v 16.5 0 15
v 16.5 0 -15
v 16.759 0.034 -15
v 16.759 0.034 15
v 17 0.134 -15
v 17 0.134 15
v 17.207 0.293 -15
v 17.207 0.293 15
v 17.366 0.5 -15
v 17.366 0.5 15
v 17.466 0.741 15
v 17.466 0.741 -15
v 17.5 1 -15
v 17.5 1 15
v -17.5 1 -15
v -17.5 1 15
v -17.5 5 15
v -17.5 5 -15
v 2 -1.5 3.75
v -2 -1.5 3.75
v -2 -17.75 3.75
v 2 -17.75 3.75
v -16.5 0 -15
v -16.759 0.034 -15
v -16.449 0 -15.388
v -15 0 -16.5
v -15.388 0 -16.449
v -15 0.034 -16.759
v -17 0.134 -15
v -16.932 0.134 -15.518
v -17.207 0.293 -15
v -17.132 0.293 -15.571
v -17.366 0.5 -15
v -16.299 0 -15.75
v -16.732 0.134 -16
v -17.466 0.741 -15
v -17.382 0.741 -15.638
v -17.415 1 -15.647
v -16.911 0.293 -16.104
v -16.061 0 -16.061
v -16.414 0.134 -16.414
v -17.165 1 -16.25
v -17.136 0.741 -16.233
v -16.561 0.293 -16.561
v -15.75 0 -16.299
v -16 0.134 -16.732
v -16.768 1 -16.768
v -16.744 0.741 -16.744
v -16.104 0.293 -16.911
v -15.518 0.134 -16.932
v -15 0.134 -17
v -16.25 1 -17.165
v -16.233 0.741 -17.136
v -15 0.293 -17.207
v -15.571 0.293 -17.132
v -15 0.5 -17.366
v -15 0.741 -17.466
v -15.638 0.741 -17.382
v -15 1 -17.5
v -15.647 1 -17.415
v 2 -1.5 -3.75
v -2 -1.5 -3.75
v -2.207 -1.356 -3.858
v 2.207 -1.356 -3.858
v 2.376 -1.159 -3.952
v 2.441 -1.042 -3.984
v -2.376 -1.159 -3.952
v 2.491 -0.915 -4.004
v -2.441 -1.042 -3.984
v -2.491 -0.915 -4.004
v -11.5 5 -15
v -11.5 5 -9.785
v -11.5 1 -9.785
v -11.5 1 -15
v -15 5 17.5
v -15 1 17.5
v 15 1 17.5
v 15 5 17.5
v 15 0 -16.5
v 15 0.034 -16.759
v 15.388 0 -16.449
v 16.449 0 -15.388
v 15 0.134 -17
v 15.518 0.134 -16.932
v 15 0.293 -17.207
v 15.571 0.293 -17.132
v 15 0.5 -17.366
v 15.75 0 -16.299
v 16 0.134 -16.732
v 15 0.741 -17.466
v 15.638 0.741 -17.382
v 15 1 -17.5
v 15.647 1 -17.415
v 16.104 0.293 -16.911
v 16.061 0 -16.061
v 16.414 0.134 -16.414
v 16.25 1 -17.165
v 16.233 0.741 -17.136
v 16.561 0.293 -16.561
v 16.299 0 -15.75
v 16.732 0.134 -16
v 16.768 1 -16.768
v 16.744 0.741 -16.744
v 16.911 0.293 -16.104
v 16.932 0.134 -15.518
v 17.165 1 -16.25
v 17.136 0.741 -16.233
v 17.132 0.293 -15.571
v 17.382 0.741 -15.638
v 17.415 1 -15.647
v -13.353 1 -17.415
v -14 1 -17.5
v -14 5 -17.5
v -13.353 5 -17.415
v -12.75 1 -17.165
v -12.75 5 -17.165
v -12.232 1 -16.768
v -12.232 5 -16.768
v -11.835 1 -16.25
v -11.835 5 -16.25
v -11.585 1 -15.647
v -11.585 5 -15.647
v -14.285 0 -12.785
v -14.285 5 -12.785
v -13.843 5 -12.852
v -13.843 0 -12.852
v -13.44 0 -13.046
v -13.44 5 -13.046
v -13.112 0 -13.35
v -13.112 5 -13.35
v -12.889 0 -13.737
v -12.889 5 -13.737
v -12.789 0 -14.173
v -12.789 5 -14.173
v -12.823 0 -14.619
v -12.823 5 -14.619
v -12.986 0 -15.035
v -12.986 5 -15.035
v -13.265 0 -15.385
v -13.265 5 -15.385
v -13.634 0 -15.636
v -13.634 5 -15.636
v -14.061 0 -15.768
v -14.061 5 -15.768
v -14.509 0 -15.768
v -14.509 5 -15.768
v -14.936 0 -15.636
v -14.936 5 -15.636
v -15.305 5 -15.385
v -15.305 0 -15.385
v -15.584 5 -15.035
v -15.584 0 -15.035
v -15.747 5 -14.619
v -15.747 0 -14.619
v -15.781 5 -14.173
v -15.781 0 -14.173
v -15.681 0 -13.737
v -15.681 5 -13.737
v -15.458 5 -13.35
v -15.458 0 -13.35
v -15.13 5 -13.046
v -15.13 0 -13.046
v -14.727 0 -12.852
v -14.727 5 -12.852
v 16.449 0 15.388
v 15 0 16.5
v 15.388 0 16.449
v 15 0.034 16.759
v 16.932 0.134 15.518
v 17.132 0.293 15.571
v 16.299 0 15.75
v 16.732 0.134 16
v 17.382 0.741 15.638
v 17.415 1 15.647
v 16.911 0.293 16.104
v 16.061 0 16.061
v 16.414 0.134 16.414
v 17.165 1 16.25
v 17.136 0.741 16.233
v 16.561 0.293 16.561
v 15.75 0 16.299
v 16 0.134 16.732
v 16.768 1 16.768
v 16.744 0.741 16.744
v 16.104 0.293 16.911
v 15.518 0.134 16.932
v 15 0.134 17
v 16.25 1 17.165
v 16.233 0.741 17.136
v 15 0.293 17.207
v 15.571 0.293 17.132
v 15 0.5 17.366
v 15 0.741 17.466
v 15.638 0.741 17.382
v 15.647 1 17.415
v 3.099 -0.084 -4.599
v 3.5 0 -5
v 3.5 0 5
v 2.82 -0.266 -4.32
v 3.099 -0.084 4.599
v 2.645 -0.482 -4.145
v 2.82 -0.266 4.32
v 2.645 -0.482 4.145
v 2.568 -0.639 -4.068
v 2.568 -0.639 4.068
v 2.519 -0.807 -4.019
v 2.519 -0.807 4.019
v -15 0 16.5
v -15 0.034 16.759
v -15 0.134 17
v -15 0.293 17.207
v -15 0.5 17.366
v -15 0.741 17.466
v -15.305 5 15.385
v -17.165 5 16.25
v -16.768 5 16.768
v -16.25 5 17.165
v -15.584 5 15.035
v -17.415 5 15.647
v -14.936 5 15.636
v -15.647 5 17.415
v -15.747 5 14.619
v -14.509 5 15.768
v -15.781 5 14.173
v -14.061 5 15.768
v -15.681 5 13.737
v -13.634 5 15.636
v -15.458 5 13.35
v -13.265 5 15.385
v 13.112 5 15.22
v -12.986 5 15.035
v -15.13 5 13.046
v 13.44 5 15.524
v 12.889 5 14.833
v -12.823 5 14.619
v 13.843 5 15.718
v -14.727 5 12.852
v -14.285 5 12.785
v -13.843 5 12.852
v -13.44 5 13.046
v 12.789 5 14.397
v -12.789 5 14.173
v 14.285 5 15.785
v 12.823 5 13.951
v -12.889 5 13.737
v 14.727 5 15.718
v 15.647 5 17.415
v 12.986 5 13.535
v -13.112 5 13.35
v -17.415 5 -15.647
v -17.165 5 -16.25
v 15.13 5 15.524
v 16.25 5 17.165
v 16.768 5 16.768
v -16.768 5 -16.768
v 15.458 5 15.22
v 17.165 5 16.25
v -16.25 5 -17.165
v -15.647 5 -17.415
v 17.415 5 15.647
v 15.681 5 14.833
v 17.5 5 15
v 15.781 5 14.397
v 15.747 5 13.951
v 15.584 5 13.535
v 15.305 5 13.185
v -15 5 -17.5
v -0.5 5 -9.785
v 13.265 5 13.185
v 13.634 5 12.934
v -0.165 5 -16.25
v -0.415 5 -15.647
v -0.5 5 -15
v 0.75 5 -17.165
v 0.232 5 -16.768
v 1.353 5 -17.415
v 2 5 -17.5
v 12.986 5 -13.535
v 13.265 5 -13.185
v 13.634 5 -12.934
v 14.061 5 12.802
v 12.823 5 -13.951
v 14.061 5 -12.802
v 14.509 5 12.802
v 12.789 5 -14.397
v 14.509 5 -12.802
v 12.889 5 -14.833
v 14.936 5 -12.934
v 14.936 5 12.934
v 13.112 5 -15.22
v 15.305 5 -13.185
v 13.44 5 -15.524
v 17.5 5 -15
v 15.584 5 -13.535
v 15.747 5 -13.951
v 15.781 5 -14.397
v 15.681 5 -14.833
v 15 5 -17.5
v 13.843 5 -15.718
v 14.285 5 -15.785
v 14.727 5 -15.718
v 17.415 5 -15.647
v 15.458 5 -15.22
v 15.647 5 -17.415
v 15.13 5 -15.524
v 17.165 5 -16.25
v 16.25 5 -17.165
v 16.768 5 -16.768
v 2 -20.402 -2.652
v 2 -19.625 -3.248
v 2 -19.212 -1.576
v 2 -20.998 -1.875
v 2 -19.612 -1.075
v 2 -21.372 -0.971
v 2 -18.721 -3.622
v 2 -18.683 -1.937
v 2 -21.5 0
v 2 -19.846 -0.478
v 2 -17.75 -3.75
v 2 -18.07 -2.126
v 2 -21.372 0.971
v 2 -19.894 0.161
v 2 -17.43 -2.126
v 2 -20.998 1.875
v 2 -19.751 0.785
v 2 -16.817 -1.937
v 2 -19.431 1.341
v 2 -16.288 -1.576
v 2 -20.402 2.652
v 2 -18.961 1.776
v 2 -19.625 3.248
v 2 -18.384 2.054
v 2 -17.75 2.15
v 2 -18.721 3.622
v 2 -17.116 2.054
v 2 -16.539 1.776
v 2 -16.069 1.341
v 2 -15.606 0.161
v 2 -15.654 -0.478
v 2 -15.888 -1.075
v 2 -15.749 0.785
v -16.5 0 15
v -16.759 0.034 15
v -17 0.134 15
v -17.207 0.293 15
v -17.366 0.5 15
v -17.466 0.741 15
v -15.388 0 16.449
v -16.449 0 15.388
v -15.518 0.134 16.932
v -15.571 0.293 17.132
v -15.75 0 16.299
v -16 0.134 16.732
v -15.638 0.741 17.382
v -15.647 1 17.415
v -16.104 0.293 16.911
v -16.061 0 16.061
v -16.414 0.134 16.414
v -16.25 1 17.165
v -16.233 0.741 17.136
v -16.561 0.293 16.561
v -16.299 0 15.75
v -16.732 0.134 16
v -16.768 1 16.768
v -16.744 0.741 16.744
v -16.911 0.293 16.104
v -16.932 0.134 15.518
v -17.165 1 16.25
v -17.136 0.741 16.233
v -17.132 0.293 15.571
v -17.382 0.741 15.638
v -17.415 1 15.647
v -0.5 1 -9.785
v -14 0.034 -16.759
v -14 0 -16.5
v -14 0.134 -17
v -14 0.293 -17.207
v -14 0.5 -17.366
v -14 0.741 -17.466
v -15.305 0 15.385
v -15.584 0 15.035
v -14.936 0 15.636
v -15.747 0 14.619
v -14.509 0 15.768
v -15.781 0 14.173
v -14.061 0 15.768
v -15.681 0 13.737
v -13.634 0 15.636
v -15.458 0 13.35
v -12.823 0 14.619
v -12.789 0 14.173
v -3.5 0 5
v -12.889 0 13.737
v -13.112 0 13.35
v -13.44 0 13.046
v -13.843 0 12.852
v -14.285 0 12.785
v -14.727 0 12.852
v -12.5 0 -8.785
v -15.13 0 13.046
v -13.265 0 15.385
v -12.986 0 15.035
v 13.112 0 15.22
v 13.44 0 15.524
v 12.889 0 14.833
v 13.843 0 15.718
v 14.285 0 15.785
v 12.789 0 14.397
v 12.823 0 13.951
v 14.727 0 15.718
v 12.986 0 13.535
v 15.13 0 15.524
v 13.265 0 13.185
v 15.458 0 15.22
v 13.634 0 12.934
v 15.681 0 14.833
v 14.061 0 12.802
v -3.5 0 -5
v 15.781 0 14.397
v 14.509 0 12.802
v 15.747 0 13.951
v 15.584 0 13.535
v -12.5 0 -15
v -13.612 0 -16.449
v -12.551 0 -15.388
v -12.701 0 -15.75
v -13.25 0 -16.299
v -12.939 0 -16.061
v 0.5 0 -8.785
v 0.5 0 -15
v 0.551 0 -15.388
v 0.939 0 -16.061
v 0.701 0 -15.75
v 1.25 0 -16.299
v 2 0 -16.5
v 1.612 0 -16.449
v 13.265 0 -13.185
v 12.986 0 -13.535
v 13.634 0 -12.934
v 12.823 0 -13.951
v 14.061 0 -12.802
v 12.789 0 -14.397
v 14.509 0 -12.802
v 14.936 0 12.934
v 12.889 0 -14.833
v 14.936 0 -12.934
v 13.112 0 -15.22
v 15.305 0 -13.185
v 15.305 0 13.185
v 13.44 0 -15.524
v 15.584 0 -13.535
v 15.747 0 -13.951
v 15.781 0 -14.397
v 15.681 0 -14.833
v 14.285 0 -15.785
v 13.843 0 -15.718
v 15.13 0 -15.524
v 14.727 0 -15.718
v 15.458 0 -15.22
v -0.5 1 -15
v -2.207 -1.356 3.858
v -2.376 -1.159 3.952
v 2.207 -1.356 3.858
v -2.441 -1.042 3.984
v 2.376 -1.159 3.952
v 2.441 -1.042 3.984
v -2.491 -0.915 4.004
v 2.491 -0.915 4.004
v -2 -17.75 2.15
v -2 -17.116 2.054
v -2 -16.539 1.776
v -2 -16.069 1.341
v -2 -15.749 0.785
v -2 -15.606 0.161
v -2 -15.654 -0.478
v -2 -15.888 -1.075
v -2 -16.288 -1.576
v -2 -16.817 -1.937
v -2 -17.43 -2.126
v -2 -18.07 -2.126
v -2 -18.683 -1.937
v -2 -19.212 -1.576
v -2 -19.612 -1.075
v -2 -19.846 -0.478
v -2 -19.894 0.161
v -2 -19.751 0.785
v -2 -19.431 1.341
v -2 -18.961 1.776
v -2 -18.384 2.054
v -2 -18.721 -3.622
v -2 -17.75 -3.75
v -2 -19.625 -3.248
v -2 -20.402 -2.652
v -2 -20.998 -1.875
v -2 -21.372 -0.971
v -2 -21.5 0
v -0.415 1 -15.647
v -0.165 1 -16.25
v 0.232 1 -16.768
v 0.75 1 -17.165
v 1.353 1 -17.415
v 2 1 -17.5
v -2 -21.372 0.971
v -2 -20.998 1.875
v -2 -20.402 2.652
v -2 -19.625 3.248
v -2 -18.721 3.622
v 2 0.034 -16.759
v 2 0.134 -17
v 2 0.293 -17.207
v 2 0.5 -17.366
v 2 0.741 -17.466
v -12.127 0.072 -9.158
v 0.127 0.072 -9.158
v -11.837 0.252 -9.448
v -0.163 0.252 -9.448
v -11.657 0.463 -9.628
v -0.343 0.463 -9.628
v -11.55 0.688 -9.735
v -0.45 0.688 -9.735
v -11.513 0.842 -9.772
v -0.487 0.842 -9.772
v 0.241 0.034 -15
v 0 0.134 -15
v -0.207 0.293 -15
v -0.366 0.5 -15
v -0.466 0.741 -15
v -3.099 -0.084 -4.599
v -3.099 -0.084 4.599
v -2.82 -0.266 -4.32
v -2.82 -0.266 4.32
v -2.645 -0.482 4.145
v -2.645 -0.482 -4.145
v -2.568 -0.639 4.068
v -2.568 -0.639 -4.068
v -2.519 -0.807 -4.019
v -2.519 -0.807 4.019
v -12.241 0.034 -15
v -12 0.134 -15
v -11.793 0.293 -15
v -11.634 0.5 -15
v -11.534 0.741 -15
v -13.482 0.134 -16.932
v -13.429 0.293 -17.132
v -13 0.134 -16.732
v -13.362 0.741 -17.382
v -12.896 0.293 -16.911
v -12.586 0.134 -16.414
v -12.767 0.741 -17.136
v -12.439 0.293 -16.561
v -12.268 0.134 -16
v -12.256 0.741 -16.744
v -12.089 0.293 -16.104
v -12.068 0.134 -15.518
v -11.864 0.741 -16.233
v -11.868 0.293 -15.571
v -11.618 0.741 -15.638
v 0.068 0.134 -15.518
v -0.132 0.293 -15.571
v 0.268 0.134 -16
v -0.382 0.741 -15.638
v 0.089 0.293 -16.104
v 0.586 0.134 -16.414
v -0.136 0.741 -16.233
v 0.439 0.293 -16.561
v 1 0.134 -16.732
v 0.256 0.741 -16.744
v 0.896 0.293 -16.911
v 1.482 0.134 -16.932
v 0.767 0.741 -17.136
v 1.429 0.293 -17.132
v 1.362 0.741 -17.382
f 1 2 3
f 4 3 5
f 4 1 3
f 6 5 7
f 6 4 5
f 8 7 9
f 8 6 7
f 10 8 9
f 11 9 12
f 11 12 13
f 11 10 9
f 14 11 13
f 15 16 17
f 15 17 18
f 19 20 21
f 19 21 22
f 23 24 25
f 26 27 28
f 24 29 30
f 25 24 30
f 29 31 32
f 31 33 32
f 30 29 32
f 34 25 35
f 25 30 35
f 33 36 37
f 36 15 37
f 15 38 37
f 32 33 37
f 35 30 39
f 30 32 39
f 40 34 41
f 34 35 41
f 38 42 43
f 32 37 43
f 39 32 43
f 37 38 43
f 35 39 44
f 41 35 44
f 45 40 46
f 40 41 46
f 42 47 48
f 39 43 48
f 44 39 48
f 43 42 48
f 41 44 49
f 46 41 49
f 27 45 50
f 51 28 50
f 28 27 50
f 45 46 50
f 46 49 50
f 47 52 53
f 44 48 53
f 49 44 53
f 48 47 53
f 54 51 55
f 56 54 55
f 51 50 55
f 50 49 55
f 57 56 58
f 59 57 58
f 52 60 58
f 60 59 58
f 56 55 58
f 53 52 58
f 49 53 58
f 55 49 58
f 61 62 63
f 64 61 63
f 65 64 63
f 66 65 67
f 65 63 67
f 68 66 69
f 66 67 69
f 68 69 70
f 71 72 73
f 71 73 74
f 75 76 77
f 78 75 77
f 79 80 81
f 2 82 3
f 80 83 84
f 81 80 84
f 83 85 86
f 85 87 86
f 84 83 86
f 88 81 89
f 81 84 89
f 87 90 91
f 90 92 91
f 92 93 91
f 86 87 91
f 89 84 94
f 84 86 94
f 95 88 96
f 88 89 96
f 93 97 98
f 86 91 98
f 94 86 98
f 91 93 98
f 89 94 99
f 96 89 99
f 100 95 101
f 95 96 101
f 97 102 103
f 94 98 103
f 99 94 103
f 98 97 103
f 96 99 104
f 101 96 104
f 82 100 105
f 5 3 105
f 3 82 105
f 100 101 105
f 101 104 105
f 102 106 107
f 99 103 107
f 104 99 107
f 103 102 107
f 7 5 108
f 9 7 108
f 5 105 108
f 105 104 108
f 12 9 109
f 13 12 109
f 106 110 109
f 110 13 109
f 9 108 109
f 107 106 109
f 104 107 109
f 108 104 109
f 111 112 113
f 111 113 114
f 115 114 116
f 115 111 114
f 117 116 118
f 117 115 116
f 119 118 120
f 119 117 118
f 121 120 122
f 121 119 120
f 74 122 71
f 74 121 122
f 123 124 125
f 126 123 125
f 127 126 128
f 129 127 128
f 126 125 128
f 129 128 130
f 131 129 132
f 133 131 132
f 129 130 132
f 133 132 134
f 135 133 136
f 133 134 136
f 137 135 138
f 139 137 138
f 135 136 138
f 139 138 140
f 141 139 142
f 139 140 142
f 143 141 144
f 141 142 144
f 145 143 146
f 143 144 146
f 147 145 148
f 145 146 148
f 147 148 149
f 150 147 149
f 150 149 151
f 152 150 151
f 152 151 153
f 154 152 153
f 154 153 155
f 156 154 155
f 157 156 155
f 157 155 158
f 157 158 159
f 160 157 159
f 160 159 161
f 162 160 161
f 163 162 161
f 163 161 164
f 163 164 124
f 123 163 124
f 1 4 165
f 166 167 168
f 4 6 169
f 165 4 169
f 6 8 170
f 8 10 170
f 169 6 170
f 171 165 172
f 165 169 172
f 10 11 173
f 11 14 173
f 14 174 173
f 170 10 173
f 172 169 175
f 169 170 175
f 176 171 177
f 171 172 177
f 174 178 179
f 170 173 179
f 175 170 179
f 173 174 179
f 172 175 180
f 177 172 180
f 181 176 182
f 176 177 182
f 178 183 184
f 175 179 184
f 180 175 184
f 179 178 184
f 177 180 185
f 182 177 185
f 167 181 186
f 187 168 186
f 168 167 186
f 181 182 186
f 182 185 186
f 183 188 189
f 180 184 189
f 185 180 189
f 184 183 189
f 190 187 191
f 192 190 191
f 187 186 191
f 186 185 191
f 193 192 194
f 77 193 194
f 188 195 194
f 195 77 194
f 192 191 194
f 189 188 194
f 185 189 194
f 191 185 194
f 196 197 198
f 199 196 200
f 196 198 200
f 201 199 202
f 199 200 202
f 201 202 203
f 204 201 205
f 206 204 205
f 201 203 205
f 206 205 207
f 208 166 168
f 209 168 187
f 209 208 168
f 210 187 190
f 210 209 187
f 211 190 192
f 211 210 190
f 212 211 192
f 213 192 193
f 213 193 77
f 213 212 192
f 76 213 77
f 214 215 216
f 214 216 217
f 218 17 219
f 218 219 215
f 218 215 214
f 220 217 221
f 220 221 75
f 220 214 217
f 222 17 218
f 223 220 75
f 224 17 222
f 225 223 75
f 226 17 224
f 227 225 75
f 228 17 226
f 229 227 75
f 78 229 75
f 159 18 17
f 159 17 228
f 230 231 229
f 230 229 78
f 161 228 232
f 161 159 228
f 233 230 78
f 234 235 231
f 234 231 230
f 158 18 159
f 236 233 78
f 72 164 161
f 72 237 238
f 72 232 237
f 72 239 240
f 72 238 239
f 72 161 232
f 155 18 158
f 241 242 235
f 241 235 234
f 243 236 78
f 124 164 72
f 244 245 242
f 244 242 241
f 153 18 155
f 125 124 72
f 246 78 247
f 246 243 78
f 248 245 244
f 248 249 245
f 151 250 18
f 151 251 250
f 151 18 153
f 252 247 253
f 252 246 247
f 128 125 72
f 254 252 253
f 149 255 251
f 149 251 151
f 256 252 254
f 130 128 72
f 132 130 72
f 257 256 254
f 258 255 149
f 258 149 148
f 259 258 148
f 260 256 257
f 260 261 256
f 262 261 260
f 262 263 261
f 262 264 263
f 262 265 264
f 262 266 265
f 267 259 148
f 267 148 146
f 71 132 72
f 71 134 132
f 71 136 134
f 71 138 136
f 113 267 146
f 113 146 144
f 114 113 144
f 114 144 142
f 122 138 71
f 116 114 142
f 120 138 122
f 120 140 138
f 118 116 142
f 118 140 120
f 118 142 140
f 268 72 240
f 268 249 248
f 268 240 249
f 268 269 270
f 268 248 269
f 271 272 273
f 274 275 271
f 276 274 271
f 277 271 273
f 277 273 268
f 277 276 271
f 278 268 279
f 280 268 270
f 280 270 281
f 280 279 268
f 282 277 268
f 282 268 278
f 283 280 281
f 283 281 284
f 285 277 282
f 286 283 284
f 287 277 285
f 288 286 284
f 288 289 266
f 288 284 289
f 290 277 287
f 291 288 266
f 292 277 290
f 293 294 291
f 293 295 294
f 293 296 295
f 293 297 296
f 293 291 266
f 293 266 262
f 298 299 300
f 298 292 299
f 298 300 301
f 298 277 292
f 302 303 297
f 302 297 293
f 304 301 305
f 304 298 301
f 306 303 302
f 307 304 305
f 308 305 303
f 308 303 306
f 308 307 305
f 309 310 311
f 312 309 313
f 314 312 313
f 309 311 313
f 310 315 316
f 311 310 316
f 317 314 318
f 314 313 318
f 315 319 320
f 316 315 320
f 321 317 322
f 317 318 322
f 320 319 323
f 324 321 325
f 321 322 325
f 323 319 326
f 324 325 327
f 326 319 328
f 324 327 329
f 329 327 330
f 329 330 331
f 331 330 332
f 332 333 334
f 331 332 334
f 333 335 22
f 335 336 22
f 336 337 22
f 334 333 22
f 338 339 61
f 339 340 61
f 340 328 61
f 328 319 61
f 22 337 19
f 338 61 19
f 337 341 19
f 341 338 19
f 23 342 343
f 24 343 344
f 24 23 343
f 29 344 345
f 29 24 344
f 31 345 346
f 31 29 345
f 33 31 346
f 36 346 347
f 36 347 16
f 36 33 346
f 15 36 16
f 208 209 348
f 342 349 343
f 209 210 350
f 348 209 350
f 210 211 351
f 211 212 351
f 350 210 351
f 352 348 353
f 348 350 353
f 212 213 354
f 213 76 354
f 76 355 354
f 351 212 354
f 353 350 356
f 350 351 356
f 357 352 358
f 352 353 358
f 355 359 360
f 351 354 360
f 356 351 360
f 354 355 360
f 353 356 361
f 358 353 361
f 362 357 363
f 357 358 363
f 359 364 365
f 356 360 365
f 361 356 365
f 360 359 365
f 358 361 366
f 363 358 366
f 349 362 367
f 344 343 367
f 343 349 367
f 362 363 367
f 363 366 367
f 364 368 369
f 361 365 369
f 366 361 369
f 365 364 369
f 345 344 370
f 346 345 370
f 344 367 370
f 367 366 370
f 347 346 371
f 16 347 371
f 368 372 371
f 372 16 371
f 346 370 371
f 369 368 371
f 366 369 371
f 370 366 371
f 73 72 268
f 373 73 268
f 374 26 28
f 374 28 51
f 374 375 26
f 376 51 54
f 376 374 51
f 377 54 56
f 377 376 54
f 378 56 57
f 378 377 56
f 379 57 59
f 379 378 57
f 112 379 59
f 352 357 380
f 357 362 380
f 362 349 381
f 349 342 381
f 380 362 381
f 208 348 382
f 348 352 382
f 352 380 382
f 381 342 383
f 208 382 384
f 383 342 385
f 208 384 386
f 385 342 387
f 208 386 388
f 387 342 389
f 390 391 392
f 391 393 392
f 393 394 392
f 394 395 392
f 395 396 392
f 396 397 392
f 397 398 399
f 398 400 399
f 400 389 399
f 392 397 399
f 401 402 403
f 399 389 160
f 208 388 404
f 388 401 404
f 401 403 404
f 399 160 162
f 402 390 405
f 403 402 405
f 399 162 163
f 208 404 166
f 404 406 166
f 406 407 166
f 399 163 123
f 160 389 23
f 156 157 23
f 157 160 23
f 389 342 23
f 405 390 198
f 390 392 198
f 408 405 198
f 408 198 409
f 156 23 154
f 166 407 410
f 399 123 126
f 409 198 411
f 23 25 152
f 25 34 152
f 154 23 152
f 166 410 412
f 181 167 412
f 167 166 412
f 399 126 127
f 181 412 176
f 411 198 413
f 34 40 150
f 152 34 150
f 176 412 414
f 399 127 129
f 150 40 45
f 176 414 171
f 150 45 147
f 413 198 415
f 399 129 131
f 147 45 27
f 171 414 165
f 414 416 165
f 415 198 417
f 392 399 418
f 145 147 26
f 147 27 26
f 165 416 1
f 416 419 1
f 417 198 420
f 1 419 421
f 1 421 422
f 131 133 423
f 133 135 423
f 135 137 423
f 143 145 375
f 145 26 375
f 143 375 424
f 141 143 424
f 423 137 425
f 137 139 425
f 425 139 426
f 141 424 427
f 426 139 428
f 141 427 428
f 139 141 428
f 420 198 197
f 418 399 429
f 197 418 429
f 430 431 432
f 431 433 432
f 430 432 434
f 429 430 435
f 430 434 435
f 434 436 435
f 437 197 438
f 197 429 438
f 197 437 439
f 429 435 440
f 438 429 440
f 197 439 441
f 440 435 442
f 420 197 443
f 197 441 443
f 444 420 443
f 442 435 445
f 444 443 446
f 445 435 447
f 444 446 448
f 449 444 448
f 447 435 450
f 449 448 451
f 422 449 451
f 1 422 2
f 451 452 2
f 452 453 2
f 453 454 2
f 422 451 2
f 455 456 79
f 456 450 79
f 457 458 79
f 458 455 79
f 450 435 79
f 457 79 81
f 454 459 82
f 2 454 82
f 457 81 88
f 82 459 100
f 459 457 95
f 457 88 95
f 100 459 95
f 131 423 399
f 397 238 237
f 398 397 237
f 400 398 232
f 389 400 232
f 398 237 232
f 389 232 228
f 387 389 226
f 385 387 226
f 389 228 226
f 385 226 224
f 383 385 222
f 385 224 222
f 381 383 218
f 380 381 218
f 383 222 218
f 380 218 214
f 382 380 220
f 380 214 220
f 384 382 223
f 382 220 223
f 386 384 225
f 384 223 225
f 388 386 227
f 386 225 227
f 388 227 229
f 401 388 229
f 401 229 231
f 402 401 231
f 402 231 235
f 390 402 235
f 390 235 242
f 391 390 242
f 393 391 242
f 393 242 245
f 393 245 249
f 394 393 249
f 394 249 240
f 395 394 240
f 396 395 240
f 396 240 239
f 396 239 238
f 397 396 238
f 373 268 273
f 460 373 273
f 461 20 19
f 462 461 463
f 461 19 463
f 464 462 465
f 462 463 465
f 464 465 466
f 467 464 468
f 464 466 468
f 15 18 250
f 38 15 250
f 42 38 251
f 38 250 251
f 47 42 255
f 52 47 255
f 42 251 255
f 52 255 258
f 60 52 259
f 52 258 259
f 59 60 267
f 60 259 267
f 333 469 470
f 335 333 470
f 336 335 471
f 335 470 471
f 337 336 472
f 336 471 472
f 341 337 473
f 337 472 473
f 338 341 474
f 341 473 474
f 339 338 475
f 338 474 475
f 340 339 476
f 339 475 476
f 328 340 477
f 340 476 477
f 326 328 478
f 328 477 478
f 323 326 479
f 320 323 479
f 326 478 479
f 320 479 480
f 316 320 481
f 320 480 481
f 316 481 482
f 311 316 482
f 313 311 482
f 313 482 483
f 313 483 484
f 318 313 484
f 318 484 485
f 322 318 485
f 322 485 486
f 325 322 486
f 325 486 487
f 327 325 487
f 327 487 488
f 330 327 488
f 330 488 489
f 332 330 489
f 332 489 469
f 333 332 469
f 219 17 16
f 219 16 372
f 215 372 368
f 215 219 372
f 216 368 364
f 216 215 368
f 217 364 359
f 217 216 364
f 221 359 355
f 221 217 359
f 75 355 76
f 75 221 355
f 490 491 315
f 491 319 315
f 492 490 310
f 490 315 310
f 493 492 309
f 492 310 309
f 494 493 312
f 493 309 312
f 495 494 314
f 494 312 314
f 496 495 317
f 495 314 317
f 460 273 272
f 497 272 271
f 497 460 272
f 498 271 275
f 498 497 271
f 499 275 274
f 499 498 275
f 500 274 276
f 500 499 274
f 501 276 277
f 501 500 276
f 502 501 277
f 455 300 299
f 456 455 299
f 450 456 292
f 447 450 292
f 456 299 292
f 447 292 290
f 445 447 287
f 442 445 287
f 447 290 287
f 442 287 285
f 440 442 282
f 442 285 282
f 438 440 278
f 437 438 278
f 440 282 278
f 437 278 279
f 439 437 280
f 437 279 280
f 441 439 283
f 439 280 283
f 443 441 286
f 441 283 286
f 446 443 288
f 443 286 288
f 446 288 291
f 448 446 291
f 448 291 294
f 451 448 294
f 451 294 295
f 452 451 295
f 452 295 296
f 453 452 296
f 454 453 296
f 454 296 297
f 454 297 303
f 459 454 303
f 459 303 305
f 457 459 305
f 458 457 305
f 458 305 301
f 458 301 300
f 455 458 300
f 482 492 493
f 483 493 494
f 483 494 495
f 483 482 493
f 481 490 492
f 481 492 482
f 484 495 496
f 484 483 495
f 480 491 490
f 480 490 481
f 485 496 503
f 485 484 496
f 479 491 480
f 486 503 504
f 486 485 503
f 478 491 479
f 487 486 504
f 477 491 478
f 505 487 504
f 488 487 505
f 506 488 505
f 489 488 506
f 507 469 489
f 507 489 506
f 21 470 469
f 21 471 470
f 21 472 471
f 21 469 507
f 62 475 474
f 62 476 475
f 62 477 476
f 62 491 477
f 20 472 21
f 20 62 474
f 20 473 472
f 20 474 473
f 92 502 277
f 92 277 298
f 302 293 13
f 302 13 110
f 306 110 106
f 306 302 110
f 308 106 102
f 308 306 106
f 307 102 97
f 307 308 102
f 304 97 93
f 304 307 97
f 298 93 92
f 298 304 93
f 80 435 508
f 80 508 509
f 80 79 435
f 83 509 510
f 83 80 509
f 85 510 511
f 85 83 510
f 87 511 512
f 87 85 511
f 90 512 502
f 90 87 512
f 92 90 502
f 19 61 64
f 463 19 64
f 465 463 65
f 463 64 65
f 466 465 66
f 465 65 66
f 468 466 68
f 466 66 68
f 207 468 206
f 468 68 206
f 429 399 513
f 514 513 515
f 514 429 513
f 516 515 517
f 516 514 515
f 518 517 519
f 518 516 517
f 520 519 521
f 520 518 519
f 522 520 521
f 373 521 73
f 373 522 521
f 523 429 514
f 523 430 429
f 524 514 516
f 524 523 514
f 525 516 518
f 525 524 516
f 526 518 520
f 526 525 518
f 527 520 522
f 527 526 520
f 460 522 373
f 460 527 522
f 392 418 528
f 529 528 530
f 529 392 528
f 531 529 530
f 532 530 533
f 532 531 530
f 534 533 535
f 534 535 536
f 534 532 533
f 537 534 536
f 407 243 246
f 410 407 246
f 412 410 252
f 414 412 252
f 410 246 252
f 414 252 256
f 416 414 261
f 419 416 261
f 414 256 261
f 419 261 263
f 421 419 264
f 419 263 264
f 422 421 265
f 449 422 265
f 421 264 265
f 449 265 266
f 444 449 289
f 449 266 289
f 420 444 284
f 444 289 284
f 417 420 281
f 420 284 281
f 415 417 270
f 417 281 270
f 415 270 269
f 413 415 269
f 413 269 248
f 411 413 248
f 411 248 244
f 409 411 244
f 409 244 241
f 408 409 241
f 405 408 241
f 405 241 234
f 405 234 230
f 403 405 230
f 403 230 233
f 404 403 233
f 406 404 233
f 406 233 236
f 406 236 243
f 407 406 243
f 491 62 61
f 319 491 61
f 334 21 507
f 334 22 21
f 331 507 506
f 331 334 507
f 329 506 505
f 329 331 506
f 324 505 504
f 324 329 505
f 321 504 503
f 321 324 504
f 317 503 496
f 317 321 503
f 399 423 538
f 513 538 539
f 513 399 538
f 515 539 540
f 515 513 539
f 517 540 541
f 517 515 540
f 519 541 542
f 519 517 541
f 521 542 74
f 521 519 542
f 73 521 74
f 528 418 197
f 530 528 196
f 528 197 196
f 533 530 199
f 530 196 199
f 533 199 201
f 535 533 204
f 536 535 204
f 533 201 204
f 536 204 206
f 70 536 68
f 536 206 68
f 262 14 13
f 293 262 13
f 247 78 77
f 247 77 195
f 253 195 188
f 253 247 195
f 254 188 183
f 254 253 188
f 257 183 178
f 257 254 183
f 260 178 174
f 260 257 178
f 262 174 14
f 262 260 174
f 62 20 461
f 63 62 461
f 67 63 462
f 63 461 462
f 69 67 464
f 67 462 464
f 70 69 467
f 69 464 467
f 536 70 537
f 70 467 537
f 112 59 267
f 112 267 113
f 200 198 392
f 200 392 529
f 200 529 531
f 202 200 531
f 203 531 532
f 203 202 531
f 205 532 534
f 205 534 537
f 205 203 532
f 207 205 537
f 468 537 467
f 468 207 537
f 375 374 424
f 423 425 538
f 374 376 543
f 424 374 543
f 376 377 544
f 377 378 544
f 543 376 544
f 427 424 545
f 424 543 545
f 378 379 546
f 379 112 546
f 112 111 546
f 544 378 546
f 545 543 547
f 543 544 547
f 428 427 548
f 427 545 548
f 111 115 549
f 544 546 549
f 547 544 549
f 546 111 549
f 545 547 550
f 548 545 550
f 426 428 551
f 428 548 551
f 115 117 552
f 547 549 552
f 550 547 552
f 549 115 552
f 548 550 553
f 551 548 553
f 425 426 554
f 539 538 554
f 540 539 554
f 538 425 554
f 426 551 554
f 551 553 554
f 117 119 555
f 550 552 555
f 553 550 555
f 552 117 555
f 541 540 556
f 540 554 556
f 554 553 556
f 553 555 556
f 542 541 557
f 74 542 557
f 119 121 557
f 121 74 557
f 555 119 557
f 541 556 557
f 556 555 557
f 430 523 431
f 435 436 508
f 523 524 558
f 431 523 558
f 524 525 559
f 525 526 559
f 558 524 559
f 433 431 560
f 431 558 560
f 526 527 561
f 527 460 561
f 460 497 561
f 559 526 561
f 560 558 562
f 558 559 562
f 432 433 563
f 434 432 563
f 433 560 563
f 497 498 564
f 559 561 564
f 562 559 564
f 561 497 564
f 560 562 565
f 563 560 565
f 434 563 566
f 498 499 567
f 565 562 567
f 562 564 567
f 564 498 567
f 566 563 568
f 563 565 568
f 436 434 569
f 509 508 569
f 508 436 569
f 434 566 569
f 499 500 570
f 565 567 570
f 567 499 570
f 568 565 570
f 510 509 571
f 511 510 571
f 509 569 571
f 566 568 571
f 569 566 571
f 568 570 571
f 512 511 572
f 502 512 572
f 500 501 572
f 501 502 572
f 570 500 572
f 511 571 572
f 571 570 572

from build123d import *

# Parameters (mm, degrees)
SKETCH_2_W          = 35
SKETCH_2_H          = 35
EXTRUDE_1_DEPTH     = 5
SKETCH_3_R          = 1.5
SKETCH_3_W          = 11
SKETCH_3_H          = 7.715
CUT_EXTRUDE_1_DEPTH = 26.248762346
SKETCH_4_W          = 5
SKETCH_4_H          = 8
EXTRUDE_2_DEPTH     = 1.5
SKETCH_5_W          = 4
SKETCH_5_H          = 7.5
EXTRUDE_3_DEPTH     = 20
FILLET_1_R          = 3.75
SKETCH_6_R          = 2.15
CUT_EXTRUDE_2_DEPTH = 8
FILLET_2_R          = 2.5
FILLET_3_R          = 2.5
FILLET_4_R          = 1
FILLET_5_R          = 1
FILLET_6_R          = 1


# Some blends are built 0.0001 mm under size
with BuildPart() as part:
    # 草图2 → 凸台-拉伸1 (new body)
    with BuildSketch(Plane(origin=(0, 0, 0), x_dir=(1, 0, 0), z_dir=(0, 1, 0))):
        Rectangle(SKETCH_2_W, SKETCH_2_H)
    extrude(amount=EXTRUDE_1_DEPTH)

    # 草图3 → 切除-拉伸1 (cut, through all)
    with BuildSketch(Plane(origin=(0, 5, 0), x_dir=(1, 0, 0), z_dir=(0, 1, 0))):
        with Locations(Location((-14.285, 14.285, 0), (0, 0, 270))):
            Circle(SKETCH_3_R)
        with Locations(Location((-14.285, -14.285, 0), (0, 0, 90))):
            Circle(SKETCH_3_R)
        with Locations(Location((14.285, -14.285, 0), (0, 0, 270))):
            Circle(SKETCH_3_R)
        with Locations(Location((14.285, 14.285, 0), (0, 0, 90))):
            Circle(SKETCH_3_R)
        with Locations((-6, 13.6425)):
            Rectangle(SKETCH_3_W, SKETCH_3_H)
    extrude(amount=-CUT_EXTRUDE_1_DEPTH, mode=Mode.SUBTRACT)

    # 草图4 → 凸台-拉伸2 (add)
    with BuildSketch(Plane.XZ):
        Rectangle(SKETCH_4_W, SKETCH_4_H)
    extrude(amount=EXTRUDE_2_DEPTH)

    # 草图5 → 凸台-拉伸3 (add)
    with BuildSketch(Plane.XZ.offset(1.5)):
        Rectangle(SKETCH_5_W, SKETCH_5_H)
    extrude(amount=EXTRUDE_3_DEPTH)

    # 圆角1
    fillet_1_edges = [part.edges().sort_by_distance(p)[0] for p in [
        (0, -21.5, -3.75),
        (0, -21.5, 3.75),
    ]]
    fillet(fillet_1_edges, radius=FILLET_1_R - 0.0001)  # a hair under: the kernel refuses the full size

    # 草图6 → 切除-拉伸2 (cut)
    with BuildSketch(Plane.ZY.offset(2)):
        with Locations((0, -17.75)):
            Circle(SKETCH_6_R)
    extrude(amount=-CUT_EXTRUDE_2_DEPTH, mode=Mode.SUBTRACT)

    # 圆角2
    fillet_2_edges = [part.edges().sort_by_distance(p)[0] for p in [
        (17.5, 2.5, 17.5),
        (-17.5, 2.5, 17.5),
        (-17.5, 2.5, -17.5),
        (17.5, 2.5, -17.5),
    ]]
    fillet(fillet_2_edges, radius=FILLET_2_R)

    # 圆角3
    fillet_3_edges = [part.edges().sort_by_distance(p)[0] for p in [
        (-11.5, 2.5, -17.5),
        (-0.5, 2.5, -17.5),
    ]]
    fillet(fillet_3_edges, radius=FILLET_3_R)

    # 圆角4
    fillet_4_edges = [part.edges().sort_by_distance(p)[0] for p in [
        (-14.5, 0, -17.5),
        (-11.5, 0, -12.3925),
        (-12.232233047, 0, -16.767766953),
        (0.232233047, 0, -16.767766953),
        (-0.5, 0, -12.3925),
        (-6, 0, -9.785),
        (8.5, 0, -17.5),
        (17.5, 0, 0),
        (0, 0, 17.5),
        (-17.5, 0, 0),
        (-16.767766953, 0, -16.767766953),
        (-16.767766953, 0, 16.767766953),
        (16.767766953, 0, 16.767766953),
        (16.767766953, 0, -16.767766953),
    ]]
    fillet(fillet_4_edges, radius=FILLET_4_R)

    # 圆角5
    fillet_5_edges = [part.edges().sort_by_distance(p)[0] for p in [
        (2.5, 0, 0),
        (0, 0, 4),
        (-2.5, 0, 0),
        (0, 0, -4),
    ]]
    fillet(fillet_5_edges, radius=FILLET_5_R)

    # 圆角6
    # the kernel refuses this fillet: 1 mm, written as the material it takes off along each edge
    with BuildSketch(Plane(origin=(-3.961914255, -1.5, -4), x_dir=(0, 0.9999810692345785, -0.006153143299889555), z_dir=(1, 0, 0)), Plane(origin=(3.961914255, -1.5, 4), x_dir=(0, 0.9999810692345785, 0.006153143299889555), z_dir=(-1, 0, 0))) as fillet_6_piece_1:
        with BuildLine():
            CenterArc((0.663387726, 0.996904498), FILLET_6_R, 228.323350496, 37.167285461)
            Line((-0.001538286, 0.249995267), (-0.068030887, 0.175304344))
            ThreePointArc((-0.068030887, 0.175304344), (-0.10076725, 0.124382319), (-0.099998107, -0.000615314))
            Line((-0.099998107, -0.000615314), (0.000615314, -0.099998107))
            ThreePointArc((0.000615314, -0.099998107), (0.500605849, -0.096921535), (0.5769035, -0.09969045))
            Line((0.5769035, -0.09969045), (0.584765702, 0))
        make_face()
    extrude(amount=7.923828511, mode=Mode.SUBTRACT)
    with BuildSketch(Plane(origin=(-2.5, -1.5, 5.734079277), x_dir=(-0.027211919166029507, 0.9996296871618517, 0), z_dir=(0, 0, -1)), Plane(origin=(2.5, -1.5, -5.734079277), x_dir=(0.02721191916602949, 0.9996296871618517, 0), z_dir=(0, 0, 1))) as fillet_6_piece_2:
        with BuildLine():
            CenterArc((0.860236658, 0.986023728), FILLET_6_R, 209.091705597, 51.317812547)
            Line((-0.01360596, 0.499814844), (-0.100990221, 0.451193955))
            ThreePointArc((-0.100990221, 0.451193955), (-0.106765949, 0.24718623), (-0.099962969, -0.002721192))
            Line((-0.099962969, -0.002721192), (0.002721192, -0.099962969))
            ThreePointArc((0.002721192, -0.099962969), (0.502536035, -0.086357009), (0.676971216, -0.098602373))
            Line((0.676971216, -0.098602373), (0.693631711, 0))
        make_face()
    extrude(amount=11.468158553, mode=Mode.SUBTRACT)


solid = part.part
